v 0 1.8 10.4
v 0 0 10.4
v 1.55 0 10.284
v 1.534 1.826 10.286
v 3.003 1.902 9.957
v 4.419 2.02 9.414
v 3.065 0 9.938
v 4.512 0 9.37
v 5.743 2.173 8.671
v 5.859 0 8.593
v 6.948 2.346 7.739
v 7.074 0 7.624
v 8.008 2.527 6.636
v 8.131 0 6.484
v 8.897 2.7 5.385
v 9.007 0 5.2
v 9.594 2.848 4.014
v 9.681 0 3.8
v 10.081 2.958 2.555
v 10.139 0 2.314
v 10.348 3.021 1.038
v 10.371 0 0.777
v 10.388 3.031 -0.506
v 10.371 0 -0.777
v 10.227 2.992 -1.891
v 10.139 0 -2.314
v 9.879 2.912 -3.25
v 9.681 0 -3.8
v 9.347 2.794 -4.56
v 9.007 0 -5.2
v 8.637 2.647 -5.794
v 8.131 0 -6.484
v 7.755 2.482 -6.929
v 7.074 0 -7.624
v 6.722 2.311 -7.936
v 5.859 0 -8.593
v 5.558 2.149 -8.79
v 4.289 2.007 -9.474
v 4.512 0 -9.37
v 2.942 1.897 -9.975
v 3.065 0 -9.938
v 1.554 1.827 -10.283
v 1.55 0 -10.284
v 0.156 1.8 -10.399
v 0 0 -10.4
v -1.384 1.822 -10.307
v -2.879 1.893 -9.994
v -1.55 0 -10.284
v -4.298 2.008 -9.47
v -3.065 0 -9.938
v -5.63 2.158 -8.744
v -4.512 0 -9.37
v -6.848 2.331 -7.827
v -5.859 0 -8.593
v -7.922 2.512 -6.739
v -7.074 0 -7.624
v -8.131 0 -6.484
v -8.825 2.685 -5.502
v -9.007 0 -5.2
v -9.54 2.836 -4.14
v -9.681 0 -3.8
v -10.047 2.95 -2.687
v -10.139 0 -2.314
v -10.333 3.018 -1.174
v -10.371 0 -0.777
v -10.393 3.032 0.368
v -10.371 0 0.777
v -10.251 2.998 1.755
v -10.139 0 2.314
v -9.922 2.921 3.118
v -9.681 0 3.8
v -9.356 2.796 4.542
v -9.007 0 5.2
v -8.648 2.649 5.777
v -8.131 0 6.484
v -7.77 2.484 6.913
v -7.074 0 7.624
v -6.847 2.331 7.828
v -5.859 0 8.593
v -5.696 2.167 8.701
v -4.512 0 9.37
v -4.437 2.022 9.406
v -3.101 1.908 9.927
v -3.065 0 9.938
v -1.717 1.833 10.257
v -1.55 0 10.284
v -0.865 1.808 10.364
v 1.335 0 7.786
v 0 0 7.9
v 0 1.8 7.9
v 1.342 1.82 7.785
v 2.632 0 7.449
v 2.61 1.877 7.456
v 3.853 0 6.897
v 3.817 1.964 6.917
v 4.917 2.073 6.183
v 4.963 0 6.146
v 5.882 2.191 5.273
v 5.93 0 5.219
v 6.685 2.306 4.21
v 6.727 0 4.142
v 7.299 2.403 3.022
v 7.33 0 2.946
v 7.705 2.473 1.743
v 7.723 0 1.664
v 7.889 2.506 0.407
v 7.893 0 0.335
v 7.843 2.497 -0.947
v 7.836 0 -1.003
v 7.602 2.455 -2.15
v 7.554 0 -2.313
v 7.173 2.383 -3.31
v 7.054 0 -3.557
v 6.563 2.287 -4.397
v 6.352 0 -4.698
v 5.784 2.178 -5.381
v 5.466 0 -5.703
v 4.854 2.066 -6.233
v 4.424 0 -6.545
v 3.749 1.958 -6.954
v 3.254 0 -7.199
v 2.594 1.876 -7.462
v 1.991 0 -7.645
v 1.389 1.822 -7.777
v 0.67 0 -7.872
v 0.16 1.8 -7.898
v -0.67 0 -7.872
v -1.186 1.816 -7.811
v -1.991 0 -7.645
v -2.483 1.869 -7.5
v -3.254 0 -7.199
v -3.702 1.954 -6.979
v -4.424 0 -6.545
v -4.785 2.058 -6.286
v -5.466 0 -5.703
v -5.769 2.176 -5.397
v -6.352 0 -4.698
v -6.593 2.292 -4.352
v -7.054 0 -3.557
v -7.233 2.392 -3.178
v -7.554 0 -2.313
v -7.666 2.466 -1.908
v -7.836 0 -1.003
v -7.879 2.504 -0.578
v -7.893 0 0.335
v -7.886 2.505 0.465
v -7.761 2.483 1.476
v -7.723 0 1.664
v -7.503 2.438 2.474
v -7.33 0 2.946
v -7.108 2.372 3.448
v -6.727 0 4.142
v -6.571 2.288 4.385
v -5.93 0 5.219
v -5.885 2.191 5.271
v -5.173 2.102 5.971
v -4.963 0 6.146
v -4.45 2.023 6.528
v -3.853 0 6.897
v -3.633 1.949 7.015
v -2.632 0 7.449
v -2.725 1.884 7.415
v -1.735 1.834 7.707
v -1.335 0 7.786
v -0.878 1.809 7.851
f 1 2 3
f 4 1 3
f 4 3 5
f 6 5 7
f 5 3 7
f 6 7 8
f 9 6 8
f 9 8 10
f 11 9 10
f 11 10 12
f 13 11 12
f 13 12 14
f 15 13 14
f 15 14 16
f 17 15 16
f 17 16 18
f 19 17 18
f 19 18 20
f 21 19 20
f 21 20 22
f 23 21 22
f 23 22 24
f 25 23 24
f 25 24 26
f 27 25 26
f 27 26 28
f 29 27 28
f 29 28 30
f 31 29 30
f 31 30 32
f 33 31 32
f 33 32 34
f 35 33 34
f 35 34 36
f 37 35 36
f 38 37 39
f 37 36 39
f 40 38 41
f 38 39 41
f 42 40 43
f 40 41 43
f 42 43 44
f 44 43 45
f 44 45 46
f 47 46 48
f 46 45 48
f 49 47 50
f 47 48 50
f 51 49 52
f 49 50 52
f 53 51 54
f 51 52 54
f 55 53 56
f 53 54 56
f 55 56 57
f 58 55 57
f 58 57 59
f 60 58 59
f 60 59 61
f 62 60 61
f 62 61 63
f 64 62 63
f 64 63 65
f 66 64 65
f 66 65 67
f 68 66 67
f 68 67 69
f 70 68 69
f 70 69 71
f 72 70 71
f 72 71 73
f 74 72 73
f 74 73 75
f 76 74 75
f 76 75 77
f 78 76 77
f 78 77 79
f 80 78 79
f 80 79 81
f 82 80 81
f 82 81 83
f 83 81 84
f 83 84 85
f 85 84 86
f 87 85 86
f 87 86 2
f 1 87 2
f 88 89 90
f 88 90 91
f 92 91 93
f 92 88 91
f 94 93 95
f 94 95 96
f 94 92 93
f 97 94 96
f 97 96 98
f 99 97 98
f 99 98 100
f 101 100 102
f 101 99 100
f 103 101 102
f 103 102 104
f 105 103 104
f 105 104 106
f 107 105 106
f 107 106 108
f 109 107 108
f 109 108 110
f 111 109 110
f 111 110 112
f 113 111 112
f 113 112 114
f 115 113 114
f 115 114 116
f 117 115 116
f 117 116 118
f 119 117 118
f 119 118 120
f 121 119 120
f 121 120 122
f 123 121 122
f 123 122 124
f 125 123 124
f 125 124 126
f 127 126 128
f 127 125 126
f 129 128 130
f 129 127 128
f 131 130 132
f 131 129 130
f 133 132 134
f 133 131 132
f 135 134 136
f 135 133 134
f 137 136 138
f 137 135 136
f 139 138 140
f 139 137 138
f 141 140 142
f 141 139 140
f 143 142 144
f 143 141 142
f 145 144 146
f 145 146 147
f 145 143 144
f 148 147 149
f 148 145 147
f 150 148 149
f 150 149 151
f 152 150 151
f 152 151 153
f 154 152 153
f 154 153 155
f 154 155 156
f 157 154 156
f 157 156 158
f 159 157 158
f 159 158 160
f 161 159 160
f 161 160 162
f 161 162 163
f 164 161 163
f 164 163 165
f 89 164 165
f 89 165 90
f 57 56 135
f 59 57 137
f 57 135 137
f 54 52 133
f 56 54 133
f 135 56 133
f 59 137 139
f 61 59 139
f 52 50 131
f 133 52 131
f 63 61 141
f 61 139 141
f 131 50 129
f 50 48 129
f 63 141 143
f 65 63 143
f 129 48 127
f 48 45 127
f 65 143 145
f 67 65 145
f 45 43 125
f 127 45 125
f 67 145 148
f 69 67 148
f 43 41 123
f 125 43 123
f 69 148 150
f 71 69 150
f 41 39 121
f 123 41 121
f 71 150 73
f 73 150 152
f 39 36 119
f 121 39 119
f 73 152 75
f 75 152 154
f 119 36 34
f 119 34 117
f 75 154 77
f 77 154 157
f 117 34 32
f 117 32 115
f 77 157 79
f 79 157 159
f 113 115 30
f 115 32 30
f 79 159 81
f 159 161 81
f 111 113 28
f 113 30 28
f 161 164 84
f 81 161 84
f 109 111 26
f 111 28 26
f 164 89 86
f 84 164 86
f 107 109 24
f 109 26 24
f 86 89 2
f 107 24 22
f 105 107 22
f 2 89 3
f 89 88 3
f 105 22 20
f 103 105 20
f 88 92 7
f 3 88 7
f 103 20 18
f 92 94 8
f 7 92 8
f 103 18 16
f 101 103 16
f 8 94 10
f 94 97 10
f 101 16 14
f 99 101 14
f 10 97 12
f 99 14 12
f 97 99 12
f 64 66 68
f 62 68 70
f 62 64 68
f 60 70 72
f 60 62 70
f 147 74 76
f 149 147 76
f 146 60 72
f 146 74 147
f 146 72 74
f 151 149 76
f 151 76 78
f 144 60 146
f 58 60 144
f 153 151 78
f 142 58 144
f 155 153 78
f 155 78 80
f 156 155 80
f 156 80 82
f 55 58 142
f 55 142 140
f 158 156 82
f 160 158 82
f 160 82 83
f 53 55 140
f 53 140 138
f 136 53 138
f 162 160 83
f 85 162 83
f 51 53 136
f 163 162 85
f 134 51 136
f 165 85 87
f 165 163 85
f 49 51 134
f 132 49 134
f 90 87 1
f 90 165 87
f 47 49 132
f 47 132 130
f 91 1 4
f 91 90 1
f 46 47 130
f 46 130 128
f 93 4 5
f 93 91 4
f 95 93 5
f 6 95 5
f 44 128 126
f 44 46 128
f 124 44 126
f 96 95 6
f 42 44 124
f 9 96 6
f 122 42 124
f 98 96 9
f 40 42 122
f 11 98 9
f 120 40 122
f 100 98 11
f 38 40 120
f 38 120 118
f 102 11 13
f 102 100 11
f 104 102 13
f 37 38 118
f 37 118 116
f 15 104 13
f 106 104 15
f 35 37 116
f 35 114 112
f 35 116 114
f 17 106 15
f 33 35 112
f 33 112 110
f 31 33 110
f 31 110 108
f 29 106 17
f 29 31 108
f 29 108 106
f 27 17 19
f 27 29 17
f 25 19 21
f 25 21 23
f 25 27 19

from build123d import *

# Parameters (mm, degrees)
SKETCH1_R                = 10.4
SKETCH1_R_2              = 7.9
BOSS_EXTRUDE1_DEPTH      = 3.2
SURFACE_EXTRUDE1_1_BACK  = 15
SURFACE_EXTRUDE1_1_DEPTH = 30


with BuildPart() as part:
    # Sketch1 → Boss-Extrude1 (new body)
    with BuildSketch(Plane(origin=(0, 0, 0), x_dir=(1, 0, 0), z_dir=(0, 1, 0))):
        with Locations(Location((0, 0, 0), (0, 0, 270))):
            Circle(SKETCH1_R)
        with Locations(Location((0, 0, 0), (0, 0, 270))):
            Circle(SKETCH1_R_2, mode=Mode.SUBTRACT)
    extrude(amount=BOSS_EXTRUDE1_DEPTH)

    # SurfaceCut5: cut with a surface, the side behind it stays
    # Surface-Extrude1: a surface, the sketch's curves swept straight by 30 mm
    with BuildLine(Plane.XY.offset(-SURFACE_EXTRUDE1_1_BACK), mode=Mode.PRIVATE) as surface_extrude1_1_path:
        CenterArc((0, 46.25), 44.45, 0, 360)
    surface_extrude1_1 = Shell.extrude(surface_extrude1_1_path.wire(), (0 * SURFACE_EXTRUDE1_1_DEPTH, 0 * SURFACE_EXTRUDE1_1_DEPTH, 1 * SURFACE_EXTRUDE1_1_DEPTH))
    split(bisect_by=surface_extrude1_1, keep=Keep.BOTTOM)


solid = part.part
